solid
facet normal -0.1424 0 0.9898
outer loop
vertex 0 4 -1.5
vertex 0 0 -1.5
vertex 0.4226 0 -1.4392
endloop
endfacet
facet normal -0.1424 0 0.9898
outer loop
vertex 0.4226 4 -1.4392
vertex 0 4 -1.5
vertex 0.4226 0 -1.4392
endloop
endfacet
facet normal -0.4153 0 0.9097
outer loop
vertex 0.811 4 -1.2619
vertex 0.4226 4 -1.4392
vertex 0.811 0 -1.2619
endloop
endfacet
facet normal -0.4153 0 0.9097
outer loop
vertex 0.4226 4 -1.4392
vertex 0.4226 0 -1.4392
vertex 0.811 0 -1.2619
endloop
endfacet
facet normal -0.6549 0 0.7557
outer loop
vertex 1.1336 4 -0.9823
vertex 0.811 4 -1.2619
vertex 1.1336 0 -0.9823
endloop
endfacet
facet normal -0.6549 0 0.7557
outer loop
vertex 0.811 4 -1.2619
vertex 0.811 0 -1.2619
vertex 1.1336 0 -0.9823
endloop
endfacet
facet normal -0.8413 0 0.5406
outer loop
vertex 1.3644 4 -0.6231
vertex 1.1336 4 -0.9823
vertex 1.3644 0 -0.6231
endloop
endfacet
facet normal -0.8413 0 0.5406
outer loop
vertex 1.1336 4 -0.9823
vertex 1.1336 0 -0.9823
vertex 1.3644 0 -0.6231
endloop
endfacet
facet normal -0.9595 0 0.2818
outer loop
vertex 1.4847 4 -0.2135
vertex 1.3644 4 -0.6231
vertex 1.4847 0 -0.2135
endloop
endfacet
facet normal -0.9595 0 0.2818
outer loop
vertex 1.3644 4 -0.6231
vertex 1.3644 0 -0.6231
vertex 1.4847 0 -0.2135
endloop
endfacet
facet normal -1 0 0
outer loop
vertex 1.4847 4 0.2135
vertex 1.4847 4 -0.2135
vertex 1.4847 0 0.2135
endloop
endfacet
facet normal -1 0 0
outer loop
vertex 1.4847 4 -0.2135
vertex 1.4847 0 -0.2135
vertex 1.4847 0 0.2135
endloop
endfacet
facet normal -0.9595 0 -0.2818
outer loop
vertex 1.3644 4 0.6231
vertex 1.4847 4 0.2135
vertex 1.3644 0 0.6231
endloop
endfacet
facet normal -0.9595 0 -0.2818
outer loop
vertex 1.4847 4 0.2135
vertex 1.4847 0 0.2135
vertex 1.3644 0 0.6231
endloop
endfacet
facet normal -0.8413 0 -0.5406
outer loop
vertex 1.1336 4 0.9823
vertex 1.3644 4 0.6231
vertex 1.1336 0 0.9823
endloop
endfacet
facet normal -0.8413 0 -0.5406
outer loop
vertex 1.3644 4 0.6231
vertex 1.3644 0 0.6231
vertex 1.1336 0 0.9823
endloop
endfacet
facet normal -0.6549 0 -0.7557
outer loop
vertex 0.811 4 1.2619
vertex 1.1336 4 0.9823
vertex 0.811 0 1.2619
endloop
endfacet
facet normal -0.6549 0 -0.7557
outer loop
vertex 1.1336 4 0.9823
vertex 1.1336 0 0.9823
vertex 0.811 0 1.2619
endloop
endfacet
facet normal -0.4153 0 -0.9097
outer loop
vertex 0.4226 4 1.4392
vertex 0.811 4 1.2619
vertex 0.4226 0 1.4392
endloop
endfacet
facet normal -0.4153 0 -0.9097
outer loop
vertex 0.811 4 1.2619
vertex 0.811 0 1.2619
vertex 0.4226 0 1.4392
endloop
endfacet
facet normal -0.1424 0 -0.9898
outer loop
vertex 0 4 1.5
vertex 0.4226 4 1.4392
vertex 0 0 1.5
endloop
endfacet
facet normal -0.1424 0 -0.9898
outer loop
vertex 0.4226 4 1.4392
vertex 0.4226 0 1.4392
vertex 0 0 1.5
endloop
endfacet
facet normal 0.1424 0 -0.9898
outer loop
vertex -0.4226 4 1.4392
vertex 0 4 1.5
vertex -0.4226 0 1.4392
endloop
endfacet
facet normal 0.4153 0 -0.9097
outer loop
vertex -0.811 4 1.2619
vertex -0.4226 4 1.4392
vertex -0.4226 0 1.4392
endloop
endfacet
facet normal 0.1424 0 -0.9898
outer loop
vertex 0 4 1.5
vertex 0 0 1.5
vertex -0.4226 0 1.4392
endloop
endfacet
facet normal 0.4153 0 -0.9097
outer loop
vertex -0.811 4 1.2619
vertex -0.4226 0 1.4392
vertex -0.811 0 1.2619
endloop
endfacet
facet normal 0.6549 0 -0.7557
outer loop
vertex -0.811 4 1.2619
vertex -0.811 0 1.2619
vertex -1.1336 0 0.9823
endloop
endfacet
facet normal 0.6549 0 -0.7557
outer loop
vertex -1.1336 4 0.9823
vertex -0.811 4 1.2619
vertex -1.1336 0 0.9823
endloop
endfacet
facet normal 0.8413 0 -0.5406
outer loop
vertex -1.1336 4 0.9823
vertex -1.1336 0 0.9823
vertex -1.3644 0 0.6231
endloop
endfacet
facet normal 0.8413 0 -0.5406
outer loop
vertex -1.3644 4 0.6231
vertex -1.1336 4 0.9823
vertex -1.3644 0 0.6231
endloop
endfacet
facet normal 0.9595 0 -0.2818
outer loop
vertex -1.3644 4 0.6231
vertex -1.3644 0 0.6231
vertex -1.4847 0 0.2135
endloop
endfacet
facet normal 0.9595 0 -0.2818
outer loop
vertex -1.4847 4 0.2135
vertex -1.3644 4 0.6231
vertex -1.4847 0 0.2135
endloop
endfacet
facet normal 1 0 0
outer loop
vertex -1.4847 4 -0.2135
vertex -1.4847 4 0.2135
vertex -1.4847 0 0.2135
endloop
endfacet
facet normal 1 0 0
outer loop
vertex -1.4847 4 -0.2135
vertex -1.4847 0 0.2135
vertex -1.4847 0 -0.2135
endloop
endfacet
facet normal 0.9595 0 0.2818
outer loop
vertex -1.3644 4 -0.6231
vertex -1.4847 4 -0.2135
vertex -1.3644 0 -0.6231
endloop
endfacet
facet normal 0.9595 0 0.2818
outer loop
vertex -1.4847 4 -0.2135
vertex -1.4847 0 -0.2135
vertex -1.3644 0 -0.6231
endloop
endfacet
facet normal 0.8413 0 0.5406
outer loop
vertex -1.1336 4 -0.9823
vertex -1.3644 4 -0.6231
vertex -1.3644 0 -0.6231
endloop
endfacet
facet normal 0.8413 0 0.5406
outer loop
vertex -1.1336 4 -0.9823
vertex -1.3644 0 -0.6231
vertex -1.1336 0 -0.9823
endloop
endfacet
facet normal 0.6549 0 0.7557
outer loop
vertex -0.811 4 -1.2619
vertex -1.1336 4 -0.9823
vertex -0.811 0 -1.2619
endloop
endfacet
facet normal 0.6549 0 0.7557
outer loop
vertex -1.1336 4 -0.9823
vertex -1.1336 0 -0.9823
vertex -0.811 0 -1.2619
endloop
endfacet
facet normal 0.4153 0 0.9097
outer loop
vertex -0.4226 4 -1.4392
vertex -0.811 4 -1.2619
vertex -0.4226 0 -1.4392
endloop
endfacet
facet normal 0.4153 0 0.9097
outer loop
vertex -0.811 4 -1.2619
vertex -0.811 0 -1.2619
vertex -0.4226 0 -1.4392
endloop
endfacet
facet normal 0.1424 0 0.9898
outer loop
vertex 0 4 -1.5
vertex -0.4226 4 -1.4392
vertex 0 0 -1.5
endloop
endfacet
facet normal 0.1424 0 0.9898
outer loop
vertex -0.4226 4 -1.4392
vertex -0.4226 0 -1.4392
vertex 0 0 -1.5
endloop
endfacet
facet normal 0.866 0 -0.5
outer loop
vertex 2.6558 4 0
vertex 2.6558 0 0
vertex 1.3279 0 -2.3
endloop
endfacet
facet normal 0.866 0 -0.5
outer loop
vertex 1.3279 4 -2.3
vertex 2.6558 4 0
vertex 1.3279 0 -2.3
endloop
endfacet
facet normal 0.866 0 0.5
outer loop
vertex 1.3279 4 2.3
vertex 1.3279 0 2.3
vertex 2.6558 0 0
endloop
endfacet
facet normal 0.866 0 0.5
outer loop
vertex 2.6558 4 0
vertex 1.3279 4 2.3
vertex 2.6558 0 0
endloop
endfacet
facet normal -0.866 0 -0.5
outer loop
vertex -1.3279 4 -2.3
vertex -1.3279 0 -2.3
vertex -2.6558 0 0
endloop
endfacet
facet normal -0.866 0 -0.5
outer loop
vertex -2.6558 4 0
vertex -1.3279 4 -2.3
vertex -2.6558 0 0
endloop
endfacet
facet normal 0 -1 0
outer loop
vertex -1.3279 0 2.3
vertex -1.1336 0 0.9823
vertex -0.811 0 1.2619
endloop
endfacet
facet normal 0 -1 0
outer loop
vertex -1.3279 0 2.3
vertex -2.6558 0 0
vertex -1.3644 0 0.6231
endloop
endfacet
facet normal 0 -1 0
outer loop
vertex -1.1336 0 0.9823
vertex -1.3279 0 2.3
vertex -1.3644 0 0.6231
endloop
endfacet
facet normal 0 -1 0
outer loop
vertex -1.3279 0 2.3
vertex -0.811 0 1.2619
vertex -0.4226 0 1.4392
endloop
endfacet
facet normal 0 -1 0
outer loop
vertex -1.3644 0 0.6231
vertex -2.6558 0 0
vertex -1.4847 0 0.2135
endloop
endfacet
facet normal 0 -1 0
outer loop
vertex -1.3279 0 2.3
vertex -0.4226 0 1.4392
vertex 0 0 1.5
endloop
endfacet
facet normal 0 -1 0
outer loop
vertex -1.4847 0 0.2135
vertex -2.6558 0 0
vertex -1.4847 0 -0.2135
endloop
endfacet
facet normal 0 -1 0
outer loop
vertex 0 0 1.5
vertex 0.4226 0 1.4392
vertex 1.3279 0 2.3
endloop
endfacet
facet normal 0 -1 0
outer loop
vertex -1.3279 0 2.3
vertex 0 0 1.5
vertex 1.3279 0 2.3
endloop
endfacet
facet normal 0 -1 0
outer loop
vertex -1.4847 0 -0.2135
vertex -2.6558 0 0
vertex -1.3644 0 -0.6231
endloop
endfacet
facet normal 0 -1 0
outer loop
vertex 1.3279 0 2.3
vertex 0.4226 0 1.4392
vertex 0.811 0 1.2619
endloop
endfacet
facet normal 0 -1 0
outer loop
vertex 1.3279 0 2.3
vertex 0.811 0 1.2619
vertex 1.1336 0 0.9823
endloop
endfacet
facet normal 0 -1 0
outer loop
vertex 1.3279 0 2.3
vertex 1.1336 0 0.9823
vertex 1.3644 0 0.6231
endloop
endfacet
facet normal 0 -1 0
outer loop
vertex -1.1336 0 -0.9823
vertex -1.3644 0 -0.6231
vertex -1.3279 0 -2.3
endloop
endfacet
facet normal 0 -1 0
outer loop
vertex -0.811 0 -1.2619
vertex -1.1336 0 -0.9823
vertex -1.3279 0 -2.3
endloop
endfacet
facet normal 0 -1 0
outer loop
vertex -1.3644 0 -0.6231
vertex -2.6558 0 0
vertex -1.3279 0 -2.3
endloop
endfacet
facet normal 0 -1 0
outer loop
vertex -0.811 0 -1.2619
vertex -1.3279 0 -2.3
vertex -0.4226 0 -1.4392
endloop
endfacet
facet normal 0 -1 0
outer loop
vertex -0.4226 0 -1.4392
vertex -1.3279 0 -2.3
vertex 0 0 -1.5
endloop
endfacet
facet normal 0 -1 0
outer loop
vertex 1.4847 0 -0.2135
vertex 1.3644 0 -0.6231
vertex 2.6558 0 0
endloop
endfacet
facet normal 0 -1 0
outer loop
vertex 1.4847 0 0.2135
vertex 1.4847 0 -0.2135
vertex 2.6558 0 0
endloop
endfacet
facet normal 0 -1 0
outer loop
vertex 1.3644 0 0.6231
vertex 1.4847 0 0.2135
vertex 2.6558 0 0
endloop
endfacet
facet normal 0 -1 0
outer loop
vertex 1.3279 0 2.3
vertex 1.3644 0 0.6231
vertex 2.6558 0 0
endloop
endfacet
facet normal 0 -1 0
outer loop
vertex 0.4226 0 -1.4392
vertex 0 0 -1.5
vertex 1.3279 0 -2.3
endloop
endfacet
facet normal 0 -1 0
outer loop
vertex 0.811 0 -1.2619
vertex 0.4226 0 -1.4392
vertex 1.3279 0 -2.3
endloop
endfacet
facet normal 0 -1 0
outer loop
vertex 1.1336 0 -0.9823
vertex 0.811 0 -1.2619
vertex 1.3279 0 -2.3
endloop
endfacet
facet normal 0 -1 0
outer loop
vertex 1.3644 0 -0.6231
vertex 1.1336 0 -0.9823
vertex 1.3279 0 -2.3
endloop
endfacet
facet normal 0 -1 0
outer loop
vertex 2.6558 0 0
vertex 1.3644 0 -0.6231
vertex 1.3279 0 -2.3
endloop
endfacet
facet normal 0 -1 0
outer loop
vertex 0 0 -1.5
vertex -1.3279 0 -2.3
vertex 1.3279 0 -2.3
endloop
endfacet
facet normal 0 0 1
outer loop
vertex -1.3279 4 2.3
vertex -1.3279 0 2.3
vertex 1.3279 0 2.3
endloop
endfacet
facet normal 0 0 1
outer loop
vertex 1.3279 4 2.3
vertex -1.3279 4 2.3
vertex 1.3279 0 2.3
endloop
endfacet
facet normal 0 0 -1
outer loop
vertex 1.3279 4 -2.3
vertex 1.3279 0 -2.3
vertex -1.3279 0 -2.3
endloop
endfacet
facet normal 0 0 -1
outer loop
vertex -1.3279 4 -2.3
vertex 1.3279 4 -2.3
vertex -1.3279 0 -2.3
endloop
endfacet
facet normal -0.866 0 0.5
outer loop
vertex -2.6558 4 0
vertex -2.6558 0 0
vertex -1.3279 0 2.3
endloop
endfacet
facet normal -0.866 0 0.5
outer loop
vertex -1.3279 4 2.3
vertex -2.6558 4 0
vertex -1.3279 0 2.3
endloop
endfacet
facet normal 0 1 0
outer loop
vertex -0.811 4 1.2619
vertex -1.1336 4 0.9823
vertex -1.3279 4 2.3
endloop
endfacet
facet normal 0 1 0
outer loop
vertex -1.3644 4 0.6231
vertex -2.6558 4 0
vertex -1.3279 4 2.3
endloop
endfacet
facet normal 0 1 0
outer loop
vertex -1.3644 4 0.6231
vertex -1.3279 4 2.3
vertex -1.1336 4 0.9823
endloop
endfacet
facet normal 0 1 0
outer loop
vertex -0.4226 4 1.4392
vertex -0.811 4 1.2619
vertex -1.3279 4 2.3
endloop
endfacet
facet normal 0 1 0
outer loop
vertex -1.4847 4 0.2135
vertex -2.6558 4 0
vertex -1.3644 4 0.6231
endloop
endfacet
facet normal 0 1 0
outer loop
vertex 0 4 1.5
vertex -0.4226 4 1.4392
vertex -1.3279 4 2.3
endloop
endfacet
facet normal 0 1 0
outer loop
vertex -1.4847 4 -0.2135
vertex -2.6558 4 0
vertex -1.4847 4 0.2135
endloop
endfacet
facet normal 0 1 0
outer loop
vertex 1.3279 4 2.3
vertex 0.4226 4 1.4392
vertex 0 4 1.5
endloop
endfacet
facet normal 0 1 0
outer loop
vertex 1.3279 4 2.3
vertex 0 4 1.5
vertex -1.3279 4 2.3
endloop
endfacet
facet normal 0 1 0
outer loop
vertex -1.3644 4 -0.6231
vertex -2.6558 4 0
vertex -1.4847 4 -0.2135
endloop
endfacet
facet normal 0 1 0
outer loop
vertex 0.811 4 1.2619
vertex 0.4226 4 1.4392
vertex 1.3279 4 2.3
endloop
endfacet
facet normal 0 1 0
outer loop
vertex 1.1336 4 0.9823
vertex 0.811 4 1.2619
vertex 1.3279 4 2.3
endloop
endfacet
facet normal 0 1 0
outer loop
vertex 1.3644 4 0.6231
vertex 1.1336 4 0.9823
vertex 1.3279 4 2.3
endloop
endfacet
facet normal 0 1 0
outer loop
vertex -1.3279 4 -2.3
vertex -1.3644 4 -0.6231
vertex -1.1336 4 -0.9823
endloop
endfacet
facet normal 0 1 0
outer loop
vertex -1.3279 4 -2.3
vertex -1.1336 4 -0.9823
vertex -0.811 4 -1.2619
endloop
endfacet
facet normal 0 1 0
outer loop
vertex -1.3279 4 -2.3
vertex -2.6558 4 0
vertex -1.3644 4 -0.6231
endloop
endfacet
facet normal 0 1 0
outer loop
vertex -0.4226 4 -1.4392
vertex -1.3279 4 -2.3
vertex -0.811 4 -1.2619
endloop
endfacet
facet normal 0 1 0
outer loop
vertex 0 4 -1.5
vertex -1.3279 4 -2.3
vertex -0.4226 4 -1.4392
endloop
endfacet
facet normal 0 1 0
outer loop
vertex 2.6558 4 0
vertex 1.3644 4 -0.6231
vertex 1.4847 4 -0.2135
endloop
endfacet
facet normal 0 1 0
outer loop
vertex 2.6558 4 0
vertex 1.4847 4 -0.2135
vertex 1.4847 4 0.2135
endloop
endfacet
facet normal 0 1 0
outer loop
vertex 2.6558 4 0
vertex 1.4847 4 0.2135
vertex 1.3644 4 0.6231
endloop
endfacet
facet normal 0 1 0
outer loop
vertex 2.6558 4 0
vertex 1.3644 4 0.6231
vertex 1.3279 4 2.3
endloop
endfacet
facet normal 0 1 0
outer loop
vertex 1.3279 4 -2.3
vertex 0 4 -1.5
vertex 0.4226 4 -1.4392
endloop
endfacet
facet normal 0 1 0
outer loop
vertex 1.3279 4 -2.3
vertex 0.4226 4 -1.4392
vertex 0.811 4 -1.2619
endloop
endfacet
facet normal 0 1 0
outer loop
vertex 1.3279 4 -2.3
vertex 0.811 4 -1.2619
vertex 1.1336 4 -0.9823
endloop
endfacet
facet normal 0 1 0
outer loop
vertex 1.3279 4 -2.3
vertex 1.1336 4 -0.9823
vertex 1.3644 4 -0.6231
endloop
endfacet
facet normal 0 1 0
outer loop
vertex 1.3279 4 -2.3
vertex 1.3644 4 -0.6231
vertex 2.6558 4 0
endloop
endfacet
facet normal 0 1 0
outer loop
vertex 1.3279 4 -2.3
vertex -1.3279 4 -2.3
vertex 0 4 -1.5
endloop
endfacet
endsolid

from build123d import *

# Parameters (mm, degrees)
EXTRUDE_1_DEPTH     = 4
SKETCH_4_R          = 1.5
CUT_EXTRUDE_1_DEPTH = 4


with BuildPart() as part:
    # 草图1 → 凸台-拉伸1 (new body)
    with BuildSketch(Plane(origin=(0, 0, 0), x_dir=(1, 0, 0), z_dir=(0, 1, 0))):
        Polygon((-1.327905619, 2.3), (-2.655811238, 0), (-1.327905619, -2.3), (1.327905619, -2.3), (2.655811238, 0), (1.327905619, 2.3), align=None)
    extrude(amount=EXTRUDE_1_DEPTH)

    # 草图4 → 切除-拉伸1 (cut)
    with BuildSketch(Plane.XZ):
        with Locations(Location((0, 0, 0), (0, 0, 270))):
            Circle(SKETCH_4_R)
    extrude(amount=-CUT_EXTRUDE_1_DEPTH, mode=Mode.SUBTRACT)


solid = part.part
